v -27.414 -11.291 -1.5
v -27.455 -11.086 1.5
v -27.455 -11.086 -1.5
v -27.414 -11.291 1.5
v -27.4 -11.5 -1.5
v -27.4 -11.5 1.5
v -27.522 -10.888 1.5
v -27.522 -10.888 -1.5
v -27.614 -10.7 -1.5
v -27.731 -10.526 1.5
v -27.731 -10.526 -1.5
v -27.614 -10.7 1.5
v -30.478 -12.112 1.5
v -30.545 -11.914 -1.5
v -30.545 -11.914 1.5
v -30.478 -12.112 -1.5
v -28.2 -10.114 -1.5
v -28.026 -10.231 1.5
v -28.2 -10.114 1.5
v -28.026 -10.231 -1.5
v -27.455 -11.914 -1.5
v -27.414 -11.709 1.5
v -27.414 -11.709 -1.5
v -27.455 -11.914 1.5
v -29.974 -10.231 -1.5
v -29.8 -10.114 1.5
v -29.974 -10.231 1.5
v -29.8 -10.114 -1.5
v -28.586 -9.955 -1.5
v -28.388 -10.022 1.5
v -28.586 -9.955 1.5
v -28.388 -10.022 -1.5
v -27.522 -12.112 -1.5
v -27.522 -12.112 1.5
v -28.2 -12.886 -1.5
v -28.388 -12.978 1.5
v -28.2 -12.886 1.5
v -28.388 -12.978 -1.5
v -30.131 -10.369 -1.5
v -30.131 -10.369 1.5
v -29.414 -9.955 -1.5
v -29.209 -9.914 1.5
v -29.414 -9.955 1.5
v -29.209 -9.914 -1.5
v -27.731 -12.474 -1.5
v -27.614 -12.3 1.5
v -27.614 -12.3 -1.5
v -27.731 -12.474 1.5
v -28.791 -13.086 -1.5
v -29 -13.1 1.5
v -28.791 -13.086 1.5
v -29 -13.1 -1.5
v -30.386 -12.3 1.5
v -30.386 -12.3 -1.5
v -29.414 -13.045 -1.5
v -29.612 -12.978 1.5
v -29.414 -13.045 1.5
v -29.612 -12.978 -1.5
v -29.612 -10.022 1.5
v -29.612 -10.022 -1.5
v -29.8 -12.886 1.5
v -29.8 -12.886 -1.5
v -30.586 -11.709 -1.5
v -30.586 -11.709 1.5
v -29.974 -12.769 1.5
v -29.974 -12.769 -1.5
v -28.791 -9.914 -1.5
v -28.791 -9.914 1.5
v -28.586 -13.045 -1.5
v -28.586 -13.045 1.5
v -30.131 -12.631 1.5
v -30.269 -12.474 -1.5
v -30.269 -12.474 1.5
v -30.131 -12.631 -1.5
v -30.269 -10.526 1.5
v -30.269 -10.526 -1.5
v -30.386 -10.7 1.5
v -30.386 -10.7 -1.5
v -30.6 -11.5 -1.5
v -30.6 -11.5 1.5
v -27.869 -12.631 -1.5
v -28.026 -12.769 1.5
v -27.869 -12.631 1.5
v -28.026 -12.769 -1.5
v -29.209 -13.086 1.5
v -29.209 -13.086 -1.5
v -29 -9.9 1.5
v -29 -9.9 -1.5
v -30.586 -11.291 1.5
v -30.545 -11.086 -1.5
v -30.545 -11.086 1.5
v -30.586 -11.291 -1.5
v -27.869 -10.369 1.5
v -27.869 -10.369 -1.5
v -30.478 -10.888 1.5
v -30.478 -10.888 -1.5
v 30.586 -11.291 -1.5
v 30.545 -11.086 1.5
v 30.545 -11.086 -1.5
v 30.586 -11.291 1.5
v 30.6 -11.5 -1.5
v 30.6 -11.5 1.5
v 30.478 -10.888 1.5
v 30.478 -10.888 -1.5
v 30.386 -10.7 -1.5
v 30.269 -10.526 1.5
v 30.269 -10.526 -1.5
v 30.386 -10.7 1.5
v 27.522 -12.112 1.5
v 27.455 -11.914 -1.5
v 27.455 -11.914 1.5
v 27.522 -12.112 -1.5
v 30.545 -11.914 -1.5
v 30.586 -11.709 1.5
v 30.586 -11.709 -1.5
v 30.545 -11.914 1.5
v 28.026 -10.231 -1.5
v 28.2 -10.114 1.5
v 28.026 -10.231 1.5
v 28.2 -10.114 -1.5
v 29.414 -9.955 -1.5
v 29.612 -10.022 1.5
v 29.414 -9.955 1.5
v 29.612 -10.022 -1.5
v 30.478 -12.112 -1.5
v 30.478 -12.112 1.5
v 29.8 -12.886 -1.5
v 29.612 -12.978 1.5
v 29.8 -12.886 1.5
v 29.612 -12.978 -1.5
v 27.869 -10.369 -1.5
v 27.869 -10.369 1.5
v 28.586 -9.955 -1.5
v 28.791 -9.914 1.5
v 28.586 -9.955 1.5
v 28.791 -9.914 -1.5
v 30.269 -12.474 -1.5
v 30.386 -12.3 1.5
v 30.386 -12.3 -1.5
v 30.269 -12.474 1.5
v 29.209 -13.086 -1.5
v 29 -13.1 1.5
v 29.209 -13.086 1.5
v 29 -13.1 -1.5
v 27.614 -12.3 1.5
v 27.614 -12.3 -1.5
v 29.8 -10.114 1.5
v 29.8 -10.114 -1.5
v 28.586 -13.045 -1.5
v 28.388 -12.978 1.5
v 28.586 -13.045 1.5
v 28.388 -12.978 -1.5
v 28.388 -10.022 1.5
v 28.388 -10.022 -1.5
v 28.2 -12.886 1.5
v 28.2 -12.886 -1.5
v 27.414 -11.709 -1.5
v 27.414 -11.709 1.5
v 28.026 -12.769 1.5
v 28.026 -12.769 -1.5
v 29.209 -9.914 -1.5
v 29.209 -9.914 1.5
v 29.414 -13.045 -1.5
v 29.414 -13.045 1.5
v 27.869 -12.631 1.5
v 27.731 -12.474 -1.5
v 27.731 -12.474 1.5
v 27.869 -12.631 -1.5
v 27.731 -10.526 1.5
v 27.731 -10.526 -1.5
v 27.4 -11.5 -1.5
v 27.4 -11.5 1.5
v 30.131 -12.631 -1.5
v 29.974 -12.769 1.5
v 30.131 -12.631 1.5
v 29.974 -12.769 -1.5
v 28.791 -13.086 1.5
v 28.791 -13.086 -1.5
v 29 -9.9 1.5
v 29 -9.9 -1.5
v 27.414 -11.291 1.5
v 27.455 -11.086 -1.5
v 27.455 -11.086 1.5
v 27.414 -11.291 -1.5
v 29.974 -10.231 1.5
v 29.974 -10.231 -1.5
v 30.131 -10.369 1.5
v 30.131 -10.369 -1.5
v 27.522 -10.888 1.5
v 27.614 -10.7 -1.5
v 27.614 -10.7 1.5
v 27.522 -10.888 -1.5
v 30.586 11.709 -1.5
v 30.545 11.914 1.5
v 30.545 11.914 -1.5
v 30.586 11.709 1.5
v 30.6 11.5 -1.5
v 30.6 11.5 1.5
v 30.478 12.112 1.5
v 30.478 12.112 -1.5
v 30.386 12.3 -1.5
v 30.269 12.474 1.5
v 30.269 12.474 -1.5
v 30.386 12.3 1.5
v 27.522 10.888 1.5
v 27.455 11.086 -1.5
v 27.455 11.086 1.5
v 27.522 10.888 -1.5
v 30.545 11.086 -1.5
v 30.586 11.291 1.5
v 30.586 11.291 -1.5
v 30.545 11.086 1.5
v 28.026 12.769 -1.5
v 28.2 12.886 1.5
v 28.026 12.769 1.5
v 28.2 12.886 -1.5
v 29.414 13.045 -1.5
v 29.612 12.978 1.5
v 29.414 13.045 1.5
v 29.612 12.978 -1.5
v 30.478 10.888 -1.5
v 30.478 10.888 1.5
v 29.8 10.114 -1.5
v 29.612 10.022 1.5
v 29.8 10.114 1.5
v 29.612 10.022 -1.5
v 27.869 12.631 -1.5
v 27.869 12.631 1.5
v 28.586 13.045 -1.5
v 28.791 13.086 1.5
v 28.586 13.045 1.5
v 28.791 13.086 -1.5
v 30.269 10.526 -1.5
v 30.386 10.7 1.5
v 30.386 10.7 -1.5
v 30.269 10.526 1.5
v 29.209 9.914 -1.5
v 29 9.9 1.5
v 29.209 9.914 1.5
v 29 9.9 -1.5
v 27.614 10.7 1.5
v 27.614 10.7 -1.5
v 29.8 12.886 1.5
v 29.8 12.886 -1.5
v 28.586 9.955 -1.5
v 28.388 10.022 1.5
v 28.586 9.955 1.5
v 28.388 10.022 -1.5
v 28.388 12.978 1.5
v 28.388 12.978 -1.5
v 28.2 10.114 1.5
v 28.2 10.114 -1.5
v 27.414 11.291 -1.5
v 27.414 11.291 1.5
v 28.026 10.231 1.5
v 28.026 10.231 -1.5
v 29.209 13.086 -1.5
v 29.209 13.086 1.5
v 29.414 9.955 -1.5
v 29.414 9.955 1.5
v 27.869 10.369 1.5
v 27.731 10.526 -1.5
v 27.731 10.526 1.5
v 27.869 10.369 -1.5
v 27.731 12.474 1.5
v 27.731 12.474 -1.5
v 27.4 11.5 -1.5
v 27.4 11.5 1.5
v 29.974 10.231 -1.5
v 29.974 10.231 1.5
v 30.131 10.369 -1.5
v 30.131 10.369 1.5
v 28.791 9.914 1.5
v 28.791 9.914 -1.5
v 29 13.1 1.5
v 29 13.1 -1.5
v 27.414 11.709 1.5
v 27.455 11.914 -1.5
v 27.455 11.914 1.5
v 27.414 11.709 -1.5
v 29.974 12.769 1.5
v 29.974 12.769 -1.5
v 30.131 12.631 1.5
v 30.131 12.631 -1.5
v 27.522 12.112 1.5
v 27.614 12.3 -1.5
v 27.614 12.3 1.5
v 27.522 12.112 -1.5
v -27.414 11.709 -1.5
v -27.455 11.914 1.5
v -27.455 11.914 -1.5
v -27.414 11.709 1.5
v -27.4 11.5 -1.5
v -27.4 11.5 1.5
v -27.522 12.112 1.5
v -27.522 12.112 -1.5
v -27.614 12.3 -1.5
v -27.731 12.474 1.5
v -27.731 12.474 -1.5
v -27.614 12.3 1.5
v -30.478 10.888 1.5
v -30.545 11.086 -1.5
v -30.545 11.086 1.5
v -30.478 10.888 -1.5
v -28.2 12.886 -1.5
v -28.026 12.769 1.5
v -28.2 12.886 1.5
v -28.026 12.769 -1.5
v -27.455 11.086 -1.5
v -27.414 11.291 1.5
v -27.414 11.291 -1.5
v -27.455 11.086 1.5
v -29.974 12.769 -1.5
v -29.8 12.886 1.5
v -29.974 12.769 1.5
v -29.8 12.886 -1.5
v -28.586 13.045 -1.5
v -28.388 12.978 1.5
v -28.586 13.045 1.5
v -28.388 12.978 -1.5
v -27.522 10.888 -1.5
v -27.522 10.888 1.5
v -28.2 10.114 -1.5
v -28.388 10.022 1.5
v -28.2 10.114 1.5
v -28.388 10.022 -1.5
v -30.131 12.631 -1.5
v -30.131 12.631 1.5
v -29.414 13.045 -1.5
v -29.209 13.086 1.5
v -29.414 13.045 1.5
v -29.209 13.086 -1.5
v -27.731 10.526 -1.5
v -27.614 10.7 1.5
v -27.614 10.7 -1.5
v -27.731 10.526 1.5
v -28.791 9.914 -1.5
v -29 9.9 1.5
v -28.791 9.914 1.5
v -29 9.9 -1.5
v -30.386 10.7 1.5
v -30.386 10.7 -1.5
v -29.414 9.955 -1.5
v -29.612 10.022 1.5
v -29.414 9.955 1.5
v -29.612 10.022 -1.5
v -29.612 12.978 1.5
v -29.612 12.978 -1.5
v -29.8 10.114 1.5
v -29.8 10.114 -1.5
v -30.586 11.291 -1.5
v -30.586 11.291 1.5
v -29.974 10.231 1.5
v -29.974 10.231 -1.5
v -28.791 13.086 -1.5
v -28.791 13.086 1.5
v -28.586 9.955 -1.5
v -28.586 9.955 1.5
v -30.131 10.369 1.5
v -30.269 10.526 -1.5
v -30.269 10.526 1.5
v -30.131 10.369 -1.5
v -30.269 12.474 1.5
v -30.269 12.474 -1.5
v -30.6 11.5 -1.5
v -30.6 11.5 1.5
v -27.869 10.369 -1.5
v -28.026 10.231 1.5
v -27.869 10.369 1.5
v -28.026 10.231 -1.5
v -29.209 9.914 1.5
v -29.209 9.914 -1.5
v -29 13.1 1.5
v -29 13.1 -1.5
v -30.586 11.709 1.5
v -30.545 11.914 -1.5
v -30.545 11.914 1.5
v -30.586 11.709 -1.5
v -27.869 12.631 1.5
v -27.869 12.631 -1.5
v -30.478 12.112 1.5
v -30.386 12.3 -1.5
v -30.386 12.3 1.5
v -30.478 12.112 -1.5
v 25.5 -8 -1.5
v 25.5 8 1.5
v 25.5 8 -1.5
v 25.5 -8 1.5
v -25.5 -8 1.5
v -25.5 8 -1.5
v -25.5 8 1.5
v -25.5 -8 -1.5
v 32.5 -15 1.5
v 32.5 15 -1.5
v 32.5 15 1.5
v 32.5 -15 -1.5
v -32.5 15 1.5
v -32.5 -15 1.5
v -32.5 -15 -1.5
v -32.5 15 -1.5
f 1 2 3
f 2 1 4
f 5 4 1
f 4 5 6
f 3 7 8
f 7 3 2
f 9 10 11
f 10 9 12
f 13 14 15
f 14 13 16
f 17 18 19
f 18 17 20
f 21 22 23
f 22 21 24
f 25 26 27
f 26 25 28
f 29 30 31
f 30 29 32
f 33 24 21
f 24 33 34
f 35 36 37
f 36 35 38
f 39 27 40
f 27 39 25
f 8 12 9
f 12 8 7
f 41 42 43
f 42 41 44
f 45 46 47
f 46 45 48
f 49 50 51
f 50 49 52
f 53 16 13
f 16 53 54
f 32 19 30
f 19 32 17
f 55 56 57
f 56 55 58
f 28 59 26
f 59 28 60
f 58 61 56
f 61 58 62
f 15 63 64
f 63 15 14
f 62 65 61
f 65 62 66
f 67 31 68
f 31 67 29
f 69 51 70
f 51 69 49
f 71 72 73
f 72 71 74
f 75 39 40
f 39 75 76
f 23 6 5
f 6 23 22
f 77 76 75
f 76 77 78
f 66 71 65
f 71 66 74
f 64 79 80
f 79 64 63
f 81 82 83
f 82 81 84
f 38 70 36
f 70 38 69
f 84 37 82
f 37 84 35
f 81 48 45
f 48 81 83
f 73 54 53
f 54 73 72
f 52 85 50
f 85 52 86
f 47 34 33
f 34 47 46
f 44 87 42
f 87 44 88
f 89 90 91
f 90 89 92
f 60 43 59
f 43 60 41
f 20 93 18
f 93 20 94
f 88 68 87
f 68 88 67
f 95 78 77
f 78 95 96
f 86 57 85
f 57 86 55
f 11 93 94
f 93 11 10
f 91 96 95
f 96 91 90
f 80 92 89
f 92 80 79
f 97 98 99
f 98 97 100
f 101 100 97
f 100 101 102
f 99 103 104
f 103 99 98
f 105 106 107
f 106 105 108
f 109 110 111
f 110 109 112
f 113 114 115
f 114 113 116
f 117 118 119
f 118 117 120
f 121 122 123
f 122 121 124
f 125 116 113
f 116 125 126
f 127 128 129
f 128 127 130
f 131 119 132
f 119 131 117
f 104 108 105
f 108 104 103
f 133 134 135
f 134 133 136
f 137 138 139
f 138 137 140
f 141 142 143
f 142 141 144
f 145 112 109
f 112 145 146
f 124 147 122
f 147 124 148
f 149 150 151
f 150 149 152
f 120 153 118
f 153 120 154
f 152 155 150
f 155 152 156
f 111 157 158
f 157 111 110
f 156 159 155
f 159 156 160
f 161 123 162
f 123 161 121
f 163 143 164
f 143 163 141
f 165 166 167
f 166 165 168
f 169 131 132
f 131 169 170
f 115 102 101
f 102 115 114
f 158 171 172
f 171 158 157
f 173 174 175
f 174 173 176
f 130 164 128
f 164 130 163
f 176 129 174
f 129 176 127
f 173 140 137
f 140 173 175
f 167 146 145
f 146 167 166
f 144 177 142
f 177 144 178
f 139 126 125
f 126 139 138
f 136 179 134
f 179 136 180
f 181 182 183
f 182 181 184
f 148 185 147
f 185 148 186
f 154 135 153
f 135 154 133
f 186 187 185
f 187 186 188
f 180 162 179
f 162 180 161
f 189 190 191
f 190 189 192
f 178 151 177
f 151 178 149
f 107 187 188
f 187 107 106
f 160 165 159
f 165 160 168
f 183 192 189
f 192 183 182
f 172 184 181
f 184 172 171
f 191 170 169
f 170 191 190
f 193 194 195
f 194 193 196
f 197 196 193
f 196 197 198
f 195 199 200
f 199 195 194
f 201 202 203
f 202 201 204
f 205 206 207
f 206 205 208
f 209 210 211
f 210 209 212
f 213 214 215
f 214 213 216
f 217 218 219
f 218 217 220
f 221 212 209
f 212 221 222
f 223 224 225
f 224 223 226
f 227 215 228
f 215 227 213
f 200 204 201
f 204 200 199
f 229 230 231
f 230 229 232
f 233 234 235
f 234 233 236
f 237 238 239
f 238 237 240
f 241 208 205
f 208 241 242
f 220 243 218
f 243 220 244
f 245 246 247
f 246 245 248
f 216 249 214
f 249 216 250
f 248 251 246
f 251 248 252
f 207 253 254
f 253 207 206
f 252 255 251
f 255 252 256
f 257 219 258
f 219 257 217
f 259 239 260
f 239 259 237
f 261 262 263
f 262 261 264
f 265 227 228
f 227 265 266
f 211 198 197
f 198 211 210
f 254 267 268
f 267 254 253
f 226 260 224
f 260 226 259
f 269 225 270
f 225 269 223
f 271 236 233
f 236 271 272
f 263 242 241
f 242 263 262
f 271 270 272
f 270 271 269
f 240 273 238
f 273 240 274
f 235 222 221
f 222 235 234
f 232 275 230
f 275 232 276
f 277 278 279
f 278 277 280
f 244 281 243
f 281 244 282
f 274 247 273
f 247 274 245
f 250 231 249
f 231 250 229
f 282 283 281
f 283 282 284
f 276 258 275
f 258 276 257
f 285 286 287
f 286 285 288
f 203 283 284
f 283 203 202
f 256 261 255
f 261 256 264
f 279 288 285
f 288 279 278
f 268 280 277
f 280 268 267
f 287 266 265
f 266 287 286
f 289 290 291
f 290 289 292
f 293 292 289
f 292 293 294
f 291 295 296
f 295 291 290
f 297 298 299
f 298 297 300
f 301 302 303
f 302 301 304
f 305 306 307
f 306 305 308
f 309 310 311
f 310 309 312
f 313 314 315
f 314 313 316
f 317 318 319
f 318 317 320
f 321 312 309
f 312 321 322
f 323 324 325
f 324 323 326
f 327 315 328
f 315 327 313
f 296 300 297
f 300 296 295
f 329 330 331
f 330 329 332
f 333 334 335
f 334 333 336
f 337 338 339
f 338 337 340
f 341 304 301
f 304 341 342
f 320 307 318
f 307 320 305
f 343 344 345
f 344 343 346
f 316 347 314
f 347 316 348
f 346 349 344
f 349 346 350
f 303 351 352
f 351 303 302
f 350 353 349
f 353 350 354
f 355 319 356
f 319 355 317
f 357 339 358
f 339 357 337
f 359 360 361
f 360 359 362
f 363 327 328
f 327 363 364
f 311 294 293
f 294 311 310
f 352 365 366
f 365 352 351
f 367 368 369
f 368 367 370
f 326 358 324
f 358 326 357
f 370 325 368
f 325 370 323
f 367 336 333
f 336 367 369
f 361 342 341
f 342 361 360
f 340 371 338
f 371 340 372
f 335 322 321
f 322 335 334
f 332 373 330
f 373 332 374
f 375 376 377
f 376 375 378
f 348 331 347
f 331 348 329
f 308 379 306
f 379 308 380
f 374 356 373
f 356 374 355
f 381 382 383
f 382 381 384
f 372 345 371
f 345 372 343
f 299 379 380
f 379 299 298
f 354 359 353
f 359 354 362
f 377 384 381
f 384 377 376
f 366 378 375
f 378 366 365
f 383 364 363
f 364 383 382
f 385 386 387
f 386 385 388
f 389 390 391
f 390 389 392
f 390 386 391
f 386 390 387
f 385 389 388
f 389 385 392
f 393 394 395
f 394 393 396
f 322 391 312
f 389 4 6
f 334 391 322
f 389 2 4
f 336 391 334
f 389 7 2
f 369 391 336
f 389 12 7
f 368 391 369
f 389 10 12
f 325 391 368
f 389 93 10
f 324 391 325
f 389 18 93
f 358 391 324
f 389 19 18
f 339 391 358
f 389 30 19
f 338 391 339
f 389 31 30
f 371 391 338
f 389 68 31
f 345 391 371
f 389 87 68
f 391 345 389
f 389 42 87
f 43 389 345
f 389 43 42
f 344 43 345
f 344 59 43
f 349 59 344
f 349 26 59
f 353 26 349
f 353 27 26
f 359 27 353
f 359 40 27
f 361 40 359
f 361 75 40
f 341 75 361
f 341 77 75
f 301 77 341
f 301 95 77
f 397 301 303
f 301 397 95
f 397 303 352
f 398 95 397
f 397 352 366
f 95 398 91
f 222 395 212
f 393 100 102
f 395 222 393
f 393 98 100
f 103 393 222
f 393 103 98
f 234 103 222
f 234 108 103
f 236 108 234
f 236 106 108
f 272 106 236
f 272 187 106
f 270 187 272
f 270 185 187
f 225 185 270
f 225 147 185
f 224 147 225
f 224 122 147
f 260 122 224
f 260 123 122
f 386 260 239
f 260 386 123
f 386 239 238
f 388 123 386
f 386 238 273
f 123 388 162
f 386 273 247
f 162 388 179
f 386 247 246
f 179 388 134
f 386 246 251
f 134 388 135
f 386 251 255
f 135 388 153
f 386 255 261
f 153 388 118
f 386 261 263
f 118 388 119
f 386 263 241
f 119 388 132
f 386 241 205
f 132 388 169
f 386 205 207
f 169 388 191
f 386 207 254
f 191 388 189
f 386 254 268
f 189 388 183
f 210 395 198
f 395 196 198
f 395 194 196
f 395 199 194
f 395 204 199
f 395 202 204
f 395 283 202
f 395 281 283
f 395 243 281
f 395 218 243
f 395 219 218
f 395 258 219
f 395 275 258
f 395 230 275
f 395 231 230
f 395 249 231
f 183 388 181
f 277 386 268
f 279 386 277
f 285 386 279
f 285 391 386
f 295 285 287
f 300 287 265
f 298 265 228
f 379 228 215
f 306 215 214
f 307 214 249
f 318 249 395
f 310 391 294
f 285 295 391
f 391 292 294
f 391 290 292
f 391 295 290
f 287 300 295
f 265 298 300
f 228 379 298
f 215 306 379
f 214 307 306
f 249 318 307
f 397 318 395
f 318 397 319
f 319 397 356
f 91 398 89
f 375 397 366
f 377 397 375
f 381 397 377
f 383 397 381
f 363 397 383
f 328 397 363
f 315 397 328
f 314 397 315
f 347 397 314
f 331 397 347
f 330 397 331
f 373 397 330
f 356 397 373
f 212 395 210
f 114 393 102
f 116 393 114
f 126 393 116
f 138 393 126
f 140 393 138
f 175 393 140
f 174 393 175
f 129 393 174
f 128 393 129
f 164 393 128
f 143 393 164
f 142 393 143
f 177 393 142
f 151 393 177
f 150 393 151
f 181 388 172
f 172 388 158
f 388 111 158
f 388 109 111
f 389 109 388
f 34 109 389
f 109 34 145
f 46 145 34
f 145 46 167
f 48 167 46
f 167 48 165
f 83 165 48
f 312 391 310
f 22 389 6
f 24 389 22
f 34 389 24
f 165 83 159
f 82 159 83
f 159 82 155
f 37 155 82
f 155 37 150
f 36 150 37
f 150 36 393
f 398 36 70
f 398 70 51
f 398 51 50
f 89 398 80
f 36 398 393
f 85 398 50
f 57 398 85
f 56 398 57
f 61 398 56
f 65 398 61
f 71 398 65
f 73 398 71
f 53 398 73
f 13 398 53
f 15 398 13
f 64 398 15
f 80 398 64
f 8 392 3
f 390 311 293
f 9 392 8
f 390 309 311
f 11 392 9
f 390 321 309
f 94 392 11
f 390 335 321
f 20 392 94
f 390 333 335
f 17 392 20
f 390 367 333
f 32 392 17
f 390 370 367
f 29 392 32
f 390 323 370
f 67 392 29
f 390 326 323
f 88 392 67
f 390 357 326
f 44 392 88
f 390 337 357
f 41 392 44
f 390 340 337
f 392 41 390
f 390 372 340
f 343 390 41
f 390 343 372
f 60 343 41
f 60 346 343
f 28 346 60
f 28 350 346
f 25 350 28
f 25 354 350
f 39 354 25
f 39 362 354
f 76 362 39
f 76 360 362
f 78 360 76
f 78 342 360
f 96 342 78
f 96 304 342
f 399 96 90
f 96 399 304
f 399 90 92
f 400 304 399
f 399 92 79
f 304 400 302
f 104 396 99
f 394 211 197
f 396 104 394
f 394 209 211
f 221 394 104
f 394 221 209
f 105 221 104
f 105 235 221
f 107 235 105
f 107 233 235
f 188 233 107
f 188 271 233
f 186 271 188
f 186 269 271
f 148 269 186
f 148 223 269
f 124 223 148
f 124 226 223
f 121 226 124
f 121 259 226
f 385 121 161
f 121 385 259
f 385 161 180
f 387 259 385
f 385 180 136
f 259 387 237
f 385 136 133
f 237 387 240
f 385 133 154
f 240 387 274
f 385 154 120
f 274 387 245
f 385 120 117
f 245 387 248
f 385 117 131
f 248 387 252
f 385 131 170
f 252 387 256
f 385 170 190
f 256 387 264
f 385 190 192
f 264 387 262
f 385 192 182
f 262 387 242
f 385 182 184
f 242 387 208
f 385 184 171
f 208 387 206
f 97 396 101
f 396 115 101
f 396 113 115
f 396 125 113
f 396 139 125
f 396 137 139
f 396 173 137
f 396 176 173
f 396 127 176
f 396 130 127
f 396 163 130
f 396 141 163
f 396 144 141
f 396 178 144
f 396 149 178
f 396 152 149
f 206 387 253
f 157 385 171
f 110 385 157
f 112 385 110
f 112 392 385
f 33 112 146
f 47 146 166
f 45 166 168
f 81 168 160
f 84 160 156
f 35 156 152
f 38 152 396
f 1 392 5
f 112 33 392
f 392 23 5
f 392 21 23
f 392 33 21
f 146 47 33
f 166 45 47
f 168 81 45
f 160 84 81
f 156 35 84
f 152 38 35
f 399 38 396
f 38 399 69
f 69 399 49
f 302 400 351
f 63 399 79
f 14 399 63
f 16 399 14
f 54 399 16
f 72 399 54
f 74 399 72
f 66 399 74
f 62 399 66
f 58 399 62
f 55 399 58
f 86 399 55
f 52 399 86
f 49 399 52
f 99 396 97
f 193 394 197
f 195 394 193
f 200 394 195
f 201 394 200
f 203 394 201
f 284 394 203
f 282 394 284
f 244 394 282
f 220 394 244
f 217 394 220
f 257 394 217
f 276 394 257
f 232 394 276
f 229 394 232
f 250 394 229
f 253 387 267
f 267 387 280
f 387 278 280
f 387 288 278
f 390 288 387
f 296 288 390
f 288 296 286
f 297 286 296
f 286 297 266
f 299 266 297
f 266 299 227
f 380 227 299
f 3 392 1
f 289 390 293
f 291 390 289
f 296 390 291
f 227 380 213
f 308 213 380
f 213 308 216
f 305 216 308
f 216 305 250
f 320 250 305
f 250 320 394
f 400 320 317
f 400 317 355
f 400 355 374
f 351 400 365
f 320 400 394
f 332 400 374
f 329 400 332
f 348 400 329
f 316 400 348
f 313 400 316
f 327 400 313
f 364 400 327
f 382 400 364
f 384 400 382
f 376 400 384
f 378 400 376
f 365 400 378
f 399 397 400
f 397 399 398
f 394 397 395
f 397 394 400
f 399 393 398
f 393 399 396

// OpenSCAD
// zero_base_flat_level.scad - a flat rectangular level for stacking Pi Zeros.
// mod of Garbage_Mount_Amp_Level.scad
// 2025 - dr.gerg@drgerg.com

pidims=[65,30,3];
$fn=48;

module hole1(){
    cylinder(h=10,r=1.6);
}

module stand(){
    cube([7,4,8],true);
}

// 
// offsetx,offsety,holespacex,holespacey
//
module drillholes(ofx,ofy,hsx,hsy){
    translate([ofx,ofy,-1])
    hole1();
    translate([ofx+hsx,ofy,-1])
    hole1();
    translate([ofx+hsx,ofy+hsy,-1])
    hole1();
    translate([ofx,ofy+hsy,-1])
    hole1();
}

// 
// offsetx,offsety,secholespacex,secholespacey
//
module secondholes(ofx,ofy,ssx,ssy){
    translate([ofx,ofy,-1])
    hole1();
    translate([ofx+ssx,ofy,-1])
    hole1();
    translate([ofx+ssx,ofy+ssy,-1])
    hole1();
    translate([ofx,ofy+ssy,-1])
    hole1();
}


module pibase(){
    translate([0,15,7])
    legpair();
    translate([0,-(pidims[1]/2)-1,19.5+(pidims[2]/2)])
    difference(){
        cube(pidims,true);
        union(){
            translate([-pidims[0]/2,-pidims[1]/2,-pidims[2]/2])
            drillholes(3.5,3.5,48.5,57.5);
            cube([pidims[0]-14,pidims[1]-14,9],true);
        }
    }
}

module amp_level(){
        difference(){
            cube(pidims,true);
            union(){
                translate([-pidims[0]/2,-pidims[1]/2,-pidims[2]/2])
                drillholes(3.5,3.5,58,23);
                // translate([-pidims[0]/2,-pidims[1]/2,-pidims[2]/2])
                // secondholes(3.5,3.5,49,57.5-25);
                cube([pidims[0]-14,pidims[1]-14,9],true);
            }
        }
    
}

amp_level();
